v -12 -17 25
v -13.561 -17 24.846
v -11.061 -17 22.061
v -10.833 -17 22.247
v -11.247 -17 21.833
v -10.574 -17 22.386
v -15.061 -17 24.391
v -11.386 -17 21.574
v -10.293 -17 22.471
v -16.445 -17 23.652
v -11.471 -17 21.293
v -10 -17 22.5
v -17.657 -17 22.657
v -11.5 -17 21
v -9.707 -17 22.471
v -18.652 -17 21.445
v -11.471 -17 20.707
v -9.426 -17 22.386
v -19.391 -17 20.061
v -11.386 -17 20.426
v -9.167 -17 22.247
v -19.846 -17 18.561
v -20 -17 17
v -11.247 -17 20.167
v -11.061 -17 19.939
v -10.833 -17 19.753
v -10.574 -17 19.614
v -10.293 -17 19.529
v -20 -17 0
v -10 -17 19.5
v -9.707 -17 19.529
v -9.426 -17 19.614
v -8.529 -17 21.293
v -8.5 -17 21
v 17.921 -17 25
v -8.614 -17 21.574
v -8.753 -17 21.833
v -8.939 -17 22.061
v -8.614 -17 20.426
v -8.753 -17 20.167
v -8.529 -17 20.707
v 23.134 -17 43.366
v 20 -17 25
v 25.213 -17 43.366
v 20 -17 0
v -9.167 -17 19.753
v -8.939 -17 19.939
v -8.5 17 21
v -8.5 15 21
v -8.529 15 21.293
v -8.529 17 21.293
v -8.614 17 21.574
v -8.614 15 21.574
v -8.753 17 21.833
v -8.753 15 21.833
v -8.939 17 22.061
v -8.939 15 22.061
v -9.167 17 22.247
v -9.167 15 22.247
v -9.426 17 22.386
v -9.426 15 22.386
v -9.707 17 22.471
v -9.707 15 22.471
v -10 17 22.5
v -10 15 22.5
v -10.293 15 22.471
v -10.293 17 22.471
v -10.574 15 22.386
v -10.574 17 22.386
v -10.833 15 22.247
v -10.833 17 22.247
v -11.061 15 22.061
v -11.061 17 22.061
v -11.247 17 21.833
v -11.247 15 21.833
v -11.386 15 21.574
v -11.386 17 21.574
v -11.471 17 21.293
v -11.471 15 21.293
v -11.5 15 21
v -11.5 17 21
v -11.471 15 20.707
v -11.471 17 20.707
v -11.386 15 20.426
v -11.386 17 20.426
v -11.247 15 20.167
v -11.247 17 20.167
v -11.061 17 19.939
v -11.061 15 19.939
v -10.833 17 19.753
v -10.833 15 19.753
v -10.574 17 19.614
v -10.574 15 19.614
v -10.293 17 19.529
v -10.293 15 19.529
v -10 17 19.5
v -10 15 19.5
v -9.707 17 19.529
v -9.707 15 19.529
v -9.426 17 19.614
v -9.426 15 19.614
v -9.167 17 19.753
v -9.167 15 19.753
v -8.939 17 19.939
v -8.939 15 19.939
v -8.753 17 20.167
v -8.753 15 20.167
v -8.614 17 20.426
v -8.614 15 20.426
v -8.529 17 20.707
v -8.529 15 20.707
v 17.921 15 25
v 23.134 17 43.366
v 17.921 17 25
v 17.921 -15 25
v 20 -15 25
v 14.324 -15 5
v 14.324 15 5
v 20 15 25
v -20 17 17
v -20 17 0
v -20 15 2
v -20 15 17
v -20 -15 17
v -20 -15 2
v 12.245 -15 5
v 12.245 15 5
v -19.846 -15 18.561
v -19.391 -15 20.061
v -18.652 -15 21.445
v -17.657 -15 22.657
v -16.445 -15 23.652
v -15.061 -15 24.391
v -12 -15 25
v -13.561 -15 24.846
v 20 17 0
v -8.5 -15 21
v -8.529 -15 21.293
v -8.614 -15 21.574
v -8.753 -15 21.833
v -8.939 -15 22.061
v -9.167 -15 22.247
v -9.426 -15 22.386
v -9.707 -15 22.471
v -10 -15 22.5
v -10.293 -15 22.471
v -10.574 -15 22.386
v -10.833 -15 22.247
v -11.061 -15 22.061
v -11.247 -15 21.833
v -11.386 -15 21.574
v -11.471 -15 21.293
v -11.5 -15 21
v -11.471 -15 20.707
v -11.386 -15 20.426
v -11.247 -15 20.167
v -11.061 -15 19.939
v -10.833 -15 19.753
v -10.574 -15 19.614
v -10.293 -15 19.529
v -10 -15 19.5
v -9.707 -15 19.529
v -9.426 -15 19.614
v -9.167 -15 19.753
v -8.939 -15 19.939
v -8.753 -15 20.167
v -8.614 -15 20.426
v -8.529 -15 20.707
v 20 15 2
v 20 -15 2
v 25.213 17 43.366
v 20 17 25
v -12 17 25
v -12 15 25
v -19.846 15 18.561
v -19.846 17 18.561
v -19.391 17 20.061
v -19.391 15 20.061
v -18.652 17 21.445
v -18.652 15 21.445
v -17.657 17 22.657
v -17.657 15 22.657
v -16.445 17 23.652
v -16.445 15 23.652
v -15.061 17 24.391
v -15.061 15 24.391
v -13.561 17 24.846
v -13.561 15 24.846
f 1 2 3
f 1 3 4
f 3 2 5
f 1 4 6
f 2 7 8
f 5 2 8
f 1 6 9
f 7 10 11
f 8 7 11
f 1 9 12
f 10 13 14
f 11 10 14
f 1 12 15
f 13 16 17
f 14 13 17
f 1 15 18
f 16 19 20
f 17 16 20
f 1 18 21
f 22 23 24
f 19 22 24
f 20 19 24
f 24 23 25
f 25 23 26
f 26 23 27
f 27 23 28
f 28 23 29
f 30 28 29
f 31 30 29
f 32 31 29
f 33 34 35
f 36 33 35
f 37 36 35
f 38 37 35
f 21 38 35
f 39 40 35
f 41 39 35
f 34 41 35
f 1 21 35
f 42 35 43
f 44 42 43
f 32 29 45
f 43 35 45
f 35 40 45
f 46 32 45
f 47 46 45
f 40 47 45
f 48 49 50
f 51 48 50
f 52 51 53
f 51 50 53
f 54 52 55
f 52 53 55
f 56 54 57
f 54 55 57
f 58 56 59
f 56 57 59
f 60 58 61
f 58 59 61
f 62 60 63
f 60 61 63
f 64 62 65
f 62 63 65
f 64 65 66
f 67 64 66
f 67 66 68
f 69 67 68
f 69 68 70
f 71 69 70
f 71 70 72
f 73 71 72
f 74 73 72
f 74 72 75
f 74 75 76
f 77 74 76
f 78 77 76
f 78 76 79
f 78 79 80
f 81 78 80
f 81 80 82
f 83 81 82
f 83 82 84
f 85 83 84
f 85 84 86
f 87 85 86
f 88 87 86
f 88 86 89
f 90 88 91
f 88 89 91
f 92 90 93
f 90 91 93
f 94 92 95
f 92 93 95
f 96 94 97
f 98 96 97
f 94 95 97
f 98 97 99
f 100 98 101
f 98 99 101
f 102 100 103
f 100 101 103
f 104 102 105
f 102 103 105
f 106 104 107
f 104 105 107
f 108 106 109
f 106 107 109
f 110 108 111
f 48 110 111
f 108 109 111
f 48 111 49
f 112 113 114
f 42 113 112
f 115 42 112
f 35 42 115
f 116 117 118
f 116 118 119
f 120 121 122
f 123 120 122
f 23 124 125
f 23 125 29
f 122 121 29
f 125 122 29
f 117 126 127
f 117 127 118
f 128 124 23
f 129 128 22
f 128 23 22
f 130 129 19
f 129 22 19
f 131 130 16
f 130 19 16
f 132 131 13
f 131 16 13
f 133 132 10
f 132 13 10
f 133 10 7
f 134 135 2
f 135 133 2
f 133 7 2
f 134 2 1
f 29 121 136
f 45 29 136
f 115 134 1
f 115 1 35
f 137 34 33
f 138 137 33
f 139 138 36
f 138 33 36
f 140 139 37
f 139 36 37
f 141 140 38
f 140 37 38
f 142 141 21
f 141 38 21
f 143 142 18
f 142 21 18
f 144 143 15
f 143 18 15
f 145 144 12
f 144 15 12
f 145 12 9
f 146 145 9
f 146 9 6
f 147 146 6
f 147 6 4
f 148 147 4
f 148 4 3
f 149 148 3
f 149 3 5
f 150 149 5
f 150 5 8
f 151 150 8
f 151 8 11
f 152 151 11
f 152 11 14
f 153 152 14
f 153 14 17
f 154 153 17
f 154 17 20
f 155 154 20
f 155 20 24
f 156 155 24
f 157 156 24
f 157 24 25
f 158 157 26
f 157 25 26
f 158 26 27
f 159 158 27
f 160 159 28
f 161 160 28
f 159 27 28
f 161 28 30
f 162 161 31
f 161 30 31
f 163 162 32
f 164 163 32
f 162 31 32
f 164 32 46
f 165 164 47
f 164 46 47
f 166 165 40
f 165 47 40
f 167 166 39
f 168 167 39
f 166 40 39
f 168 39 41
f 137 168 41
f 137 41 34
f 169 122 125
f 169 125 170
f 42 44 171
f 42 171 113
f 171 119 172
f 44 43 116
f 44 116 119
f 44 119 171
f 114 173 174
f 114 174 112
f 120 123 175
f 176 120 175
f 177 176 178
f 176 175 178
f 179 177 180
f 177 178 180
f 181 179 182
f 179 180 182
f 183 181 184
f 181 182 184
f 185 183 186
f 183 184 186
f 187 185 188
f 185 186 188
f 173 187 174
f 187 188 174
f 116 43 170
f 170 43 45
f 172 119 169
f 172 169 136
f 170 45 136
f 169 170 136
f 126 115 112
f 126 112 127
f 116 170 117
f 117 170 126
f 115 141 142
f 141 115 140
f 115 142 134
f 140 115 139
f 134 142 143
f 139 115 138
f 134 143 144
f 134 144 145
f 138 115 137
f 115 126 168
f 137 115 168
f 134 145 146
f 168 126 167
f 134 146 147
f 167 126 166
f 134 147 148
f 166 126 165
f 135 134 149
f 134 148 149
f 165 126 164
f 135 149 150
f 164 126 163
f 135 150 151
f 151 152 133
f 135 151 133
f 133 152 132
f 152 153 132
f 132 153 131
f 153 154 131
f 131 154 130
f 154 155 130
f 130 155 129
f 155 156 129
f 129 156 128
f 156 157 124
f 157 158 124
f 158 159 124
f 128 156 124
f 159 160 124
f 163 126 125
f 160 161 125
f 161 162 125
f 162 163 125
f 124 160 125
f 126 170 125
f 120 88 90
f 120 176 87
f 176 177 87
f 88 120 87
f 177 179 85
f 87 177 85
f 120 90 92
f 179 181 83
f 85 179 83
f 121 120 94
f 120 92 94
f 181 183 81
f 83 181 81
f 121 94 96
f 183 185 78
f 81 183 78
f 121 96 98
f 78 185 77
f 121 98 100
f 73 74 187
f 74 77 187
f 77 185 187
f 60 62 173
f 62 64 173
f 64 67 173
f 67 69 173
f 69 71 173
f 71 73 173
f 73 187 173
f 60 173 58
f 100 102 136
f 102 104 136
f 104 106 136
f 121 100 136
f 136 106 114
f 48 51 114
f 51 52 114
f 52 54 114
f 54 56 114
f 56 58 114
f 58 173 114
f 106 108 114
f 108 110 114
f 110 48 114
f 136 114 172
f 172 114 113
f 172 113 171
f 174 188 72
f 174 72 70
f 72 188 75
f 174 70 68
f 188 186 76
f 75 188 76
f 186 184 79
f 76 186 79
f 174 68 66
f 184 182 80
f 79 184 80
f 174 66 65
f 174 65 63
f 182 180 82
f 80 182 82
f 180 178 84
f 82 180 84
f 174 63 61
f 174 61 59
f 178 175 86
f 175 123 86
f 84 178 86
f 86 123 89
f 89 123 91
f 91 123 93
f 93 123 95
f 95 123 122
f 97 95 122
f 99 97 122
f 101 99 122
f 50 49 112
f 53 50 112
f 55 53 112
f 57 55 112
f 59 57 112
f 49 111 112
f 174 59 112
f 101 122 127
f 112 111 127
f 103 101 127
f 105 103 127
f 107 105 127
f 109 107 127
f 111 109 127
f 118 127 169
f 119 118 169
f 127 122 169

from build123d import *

# Parameters (mm, degrees)
F1_DEPTH = 2
F2_DEPTH = 25
F3_R     = 1.5
F4_DEPTH = 34
F5_DEPTH = 34


with BuildPart() as f1:
    # F0 (on Top) → F1 (new body)
    with BuildSketch(Plane.XY):
        Polygon((0, -15), (20, -15), (20, 15), (0, 15), (-20, 15), (-20, -15), align=None)
    extrude(amount=F1_DEPTH)

    # F0 (on Top) → F2 (join)
    with BuildSketch(Plane.XY):
        Polygon((0, 15), (20, 15), (20, 17), (-20, 17), (-20, 15), align=None)
        Polygon((-20, -17), (20, -17), (20, -15), (0, -15), (-20, -15), align=None)
    extrude(amount=F2_DEPTH)

    # F3 (on face) → F4 (cut)
    with BuildSketch(Plane.XZ.offset(17)):
        with BuildLine():
            ThreePointArc((-20, 17), (-17.656854, 22.656854), (-12, 25))
            Line((-12, 25), (-20, 25))
            Line((-20, 25), (-20, 17))
        make_face()
        with Locations((-10, 21)):
            Circle(F3_R)
    extrude(amount=-F4_DEPTH, mode=Mode.SUBTRACT)

    # F3 (on face) → F5 (join)
    with BuildSketch(Plane.XZ.offset(17)):
        Polygon((20, 25), (17.921008, 25), (12.244668, 5), (14.32366, 5), align=None)
        Polygon((23.133647, 43.366198), (17.921008, 25), (20, 25), (25.212639, 43.366198), align=None)
    extrude(amount=-F5_DEPTH)


solid = f1.part
